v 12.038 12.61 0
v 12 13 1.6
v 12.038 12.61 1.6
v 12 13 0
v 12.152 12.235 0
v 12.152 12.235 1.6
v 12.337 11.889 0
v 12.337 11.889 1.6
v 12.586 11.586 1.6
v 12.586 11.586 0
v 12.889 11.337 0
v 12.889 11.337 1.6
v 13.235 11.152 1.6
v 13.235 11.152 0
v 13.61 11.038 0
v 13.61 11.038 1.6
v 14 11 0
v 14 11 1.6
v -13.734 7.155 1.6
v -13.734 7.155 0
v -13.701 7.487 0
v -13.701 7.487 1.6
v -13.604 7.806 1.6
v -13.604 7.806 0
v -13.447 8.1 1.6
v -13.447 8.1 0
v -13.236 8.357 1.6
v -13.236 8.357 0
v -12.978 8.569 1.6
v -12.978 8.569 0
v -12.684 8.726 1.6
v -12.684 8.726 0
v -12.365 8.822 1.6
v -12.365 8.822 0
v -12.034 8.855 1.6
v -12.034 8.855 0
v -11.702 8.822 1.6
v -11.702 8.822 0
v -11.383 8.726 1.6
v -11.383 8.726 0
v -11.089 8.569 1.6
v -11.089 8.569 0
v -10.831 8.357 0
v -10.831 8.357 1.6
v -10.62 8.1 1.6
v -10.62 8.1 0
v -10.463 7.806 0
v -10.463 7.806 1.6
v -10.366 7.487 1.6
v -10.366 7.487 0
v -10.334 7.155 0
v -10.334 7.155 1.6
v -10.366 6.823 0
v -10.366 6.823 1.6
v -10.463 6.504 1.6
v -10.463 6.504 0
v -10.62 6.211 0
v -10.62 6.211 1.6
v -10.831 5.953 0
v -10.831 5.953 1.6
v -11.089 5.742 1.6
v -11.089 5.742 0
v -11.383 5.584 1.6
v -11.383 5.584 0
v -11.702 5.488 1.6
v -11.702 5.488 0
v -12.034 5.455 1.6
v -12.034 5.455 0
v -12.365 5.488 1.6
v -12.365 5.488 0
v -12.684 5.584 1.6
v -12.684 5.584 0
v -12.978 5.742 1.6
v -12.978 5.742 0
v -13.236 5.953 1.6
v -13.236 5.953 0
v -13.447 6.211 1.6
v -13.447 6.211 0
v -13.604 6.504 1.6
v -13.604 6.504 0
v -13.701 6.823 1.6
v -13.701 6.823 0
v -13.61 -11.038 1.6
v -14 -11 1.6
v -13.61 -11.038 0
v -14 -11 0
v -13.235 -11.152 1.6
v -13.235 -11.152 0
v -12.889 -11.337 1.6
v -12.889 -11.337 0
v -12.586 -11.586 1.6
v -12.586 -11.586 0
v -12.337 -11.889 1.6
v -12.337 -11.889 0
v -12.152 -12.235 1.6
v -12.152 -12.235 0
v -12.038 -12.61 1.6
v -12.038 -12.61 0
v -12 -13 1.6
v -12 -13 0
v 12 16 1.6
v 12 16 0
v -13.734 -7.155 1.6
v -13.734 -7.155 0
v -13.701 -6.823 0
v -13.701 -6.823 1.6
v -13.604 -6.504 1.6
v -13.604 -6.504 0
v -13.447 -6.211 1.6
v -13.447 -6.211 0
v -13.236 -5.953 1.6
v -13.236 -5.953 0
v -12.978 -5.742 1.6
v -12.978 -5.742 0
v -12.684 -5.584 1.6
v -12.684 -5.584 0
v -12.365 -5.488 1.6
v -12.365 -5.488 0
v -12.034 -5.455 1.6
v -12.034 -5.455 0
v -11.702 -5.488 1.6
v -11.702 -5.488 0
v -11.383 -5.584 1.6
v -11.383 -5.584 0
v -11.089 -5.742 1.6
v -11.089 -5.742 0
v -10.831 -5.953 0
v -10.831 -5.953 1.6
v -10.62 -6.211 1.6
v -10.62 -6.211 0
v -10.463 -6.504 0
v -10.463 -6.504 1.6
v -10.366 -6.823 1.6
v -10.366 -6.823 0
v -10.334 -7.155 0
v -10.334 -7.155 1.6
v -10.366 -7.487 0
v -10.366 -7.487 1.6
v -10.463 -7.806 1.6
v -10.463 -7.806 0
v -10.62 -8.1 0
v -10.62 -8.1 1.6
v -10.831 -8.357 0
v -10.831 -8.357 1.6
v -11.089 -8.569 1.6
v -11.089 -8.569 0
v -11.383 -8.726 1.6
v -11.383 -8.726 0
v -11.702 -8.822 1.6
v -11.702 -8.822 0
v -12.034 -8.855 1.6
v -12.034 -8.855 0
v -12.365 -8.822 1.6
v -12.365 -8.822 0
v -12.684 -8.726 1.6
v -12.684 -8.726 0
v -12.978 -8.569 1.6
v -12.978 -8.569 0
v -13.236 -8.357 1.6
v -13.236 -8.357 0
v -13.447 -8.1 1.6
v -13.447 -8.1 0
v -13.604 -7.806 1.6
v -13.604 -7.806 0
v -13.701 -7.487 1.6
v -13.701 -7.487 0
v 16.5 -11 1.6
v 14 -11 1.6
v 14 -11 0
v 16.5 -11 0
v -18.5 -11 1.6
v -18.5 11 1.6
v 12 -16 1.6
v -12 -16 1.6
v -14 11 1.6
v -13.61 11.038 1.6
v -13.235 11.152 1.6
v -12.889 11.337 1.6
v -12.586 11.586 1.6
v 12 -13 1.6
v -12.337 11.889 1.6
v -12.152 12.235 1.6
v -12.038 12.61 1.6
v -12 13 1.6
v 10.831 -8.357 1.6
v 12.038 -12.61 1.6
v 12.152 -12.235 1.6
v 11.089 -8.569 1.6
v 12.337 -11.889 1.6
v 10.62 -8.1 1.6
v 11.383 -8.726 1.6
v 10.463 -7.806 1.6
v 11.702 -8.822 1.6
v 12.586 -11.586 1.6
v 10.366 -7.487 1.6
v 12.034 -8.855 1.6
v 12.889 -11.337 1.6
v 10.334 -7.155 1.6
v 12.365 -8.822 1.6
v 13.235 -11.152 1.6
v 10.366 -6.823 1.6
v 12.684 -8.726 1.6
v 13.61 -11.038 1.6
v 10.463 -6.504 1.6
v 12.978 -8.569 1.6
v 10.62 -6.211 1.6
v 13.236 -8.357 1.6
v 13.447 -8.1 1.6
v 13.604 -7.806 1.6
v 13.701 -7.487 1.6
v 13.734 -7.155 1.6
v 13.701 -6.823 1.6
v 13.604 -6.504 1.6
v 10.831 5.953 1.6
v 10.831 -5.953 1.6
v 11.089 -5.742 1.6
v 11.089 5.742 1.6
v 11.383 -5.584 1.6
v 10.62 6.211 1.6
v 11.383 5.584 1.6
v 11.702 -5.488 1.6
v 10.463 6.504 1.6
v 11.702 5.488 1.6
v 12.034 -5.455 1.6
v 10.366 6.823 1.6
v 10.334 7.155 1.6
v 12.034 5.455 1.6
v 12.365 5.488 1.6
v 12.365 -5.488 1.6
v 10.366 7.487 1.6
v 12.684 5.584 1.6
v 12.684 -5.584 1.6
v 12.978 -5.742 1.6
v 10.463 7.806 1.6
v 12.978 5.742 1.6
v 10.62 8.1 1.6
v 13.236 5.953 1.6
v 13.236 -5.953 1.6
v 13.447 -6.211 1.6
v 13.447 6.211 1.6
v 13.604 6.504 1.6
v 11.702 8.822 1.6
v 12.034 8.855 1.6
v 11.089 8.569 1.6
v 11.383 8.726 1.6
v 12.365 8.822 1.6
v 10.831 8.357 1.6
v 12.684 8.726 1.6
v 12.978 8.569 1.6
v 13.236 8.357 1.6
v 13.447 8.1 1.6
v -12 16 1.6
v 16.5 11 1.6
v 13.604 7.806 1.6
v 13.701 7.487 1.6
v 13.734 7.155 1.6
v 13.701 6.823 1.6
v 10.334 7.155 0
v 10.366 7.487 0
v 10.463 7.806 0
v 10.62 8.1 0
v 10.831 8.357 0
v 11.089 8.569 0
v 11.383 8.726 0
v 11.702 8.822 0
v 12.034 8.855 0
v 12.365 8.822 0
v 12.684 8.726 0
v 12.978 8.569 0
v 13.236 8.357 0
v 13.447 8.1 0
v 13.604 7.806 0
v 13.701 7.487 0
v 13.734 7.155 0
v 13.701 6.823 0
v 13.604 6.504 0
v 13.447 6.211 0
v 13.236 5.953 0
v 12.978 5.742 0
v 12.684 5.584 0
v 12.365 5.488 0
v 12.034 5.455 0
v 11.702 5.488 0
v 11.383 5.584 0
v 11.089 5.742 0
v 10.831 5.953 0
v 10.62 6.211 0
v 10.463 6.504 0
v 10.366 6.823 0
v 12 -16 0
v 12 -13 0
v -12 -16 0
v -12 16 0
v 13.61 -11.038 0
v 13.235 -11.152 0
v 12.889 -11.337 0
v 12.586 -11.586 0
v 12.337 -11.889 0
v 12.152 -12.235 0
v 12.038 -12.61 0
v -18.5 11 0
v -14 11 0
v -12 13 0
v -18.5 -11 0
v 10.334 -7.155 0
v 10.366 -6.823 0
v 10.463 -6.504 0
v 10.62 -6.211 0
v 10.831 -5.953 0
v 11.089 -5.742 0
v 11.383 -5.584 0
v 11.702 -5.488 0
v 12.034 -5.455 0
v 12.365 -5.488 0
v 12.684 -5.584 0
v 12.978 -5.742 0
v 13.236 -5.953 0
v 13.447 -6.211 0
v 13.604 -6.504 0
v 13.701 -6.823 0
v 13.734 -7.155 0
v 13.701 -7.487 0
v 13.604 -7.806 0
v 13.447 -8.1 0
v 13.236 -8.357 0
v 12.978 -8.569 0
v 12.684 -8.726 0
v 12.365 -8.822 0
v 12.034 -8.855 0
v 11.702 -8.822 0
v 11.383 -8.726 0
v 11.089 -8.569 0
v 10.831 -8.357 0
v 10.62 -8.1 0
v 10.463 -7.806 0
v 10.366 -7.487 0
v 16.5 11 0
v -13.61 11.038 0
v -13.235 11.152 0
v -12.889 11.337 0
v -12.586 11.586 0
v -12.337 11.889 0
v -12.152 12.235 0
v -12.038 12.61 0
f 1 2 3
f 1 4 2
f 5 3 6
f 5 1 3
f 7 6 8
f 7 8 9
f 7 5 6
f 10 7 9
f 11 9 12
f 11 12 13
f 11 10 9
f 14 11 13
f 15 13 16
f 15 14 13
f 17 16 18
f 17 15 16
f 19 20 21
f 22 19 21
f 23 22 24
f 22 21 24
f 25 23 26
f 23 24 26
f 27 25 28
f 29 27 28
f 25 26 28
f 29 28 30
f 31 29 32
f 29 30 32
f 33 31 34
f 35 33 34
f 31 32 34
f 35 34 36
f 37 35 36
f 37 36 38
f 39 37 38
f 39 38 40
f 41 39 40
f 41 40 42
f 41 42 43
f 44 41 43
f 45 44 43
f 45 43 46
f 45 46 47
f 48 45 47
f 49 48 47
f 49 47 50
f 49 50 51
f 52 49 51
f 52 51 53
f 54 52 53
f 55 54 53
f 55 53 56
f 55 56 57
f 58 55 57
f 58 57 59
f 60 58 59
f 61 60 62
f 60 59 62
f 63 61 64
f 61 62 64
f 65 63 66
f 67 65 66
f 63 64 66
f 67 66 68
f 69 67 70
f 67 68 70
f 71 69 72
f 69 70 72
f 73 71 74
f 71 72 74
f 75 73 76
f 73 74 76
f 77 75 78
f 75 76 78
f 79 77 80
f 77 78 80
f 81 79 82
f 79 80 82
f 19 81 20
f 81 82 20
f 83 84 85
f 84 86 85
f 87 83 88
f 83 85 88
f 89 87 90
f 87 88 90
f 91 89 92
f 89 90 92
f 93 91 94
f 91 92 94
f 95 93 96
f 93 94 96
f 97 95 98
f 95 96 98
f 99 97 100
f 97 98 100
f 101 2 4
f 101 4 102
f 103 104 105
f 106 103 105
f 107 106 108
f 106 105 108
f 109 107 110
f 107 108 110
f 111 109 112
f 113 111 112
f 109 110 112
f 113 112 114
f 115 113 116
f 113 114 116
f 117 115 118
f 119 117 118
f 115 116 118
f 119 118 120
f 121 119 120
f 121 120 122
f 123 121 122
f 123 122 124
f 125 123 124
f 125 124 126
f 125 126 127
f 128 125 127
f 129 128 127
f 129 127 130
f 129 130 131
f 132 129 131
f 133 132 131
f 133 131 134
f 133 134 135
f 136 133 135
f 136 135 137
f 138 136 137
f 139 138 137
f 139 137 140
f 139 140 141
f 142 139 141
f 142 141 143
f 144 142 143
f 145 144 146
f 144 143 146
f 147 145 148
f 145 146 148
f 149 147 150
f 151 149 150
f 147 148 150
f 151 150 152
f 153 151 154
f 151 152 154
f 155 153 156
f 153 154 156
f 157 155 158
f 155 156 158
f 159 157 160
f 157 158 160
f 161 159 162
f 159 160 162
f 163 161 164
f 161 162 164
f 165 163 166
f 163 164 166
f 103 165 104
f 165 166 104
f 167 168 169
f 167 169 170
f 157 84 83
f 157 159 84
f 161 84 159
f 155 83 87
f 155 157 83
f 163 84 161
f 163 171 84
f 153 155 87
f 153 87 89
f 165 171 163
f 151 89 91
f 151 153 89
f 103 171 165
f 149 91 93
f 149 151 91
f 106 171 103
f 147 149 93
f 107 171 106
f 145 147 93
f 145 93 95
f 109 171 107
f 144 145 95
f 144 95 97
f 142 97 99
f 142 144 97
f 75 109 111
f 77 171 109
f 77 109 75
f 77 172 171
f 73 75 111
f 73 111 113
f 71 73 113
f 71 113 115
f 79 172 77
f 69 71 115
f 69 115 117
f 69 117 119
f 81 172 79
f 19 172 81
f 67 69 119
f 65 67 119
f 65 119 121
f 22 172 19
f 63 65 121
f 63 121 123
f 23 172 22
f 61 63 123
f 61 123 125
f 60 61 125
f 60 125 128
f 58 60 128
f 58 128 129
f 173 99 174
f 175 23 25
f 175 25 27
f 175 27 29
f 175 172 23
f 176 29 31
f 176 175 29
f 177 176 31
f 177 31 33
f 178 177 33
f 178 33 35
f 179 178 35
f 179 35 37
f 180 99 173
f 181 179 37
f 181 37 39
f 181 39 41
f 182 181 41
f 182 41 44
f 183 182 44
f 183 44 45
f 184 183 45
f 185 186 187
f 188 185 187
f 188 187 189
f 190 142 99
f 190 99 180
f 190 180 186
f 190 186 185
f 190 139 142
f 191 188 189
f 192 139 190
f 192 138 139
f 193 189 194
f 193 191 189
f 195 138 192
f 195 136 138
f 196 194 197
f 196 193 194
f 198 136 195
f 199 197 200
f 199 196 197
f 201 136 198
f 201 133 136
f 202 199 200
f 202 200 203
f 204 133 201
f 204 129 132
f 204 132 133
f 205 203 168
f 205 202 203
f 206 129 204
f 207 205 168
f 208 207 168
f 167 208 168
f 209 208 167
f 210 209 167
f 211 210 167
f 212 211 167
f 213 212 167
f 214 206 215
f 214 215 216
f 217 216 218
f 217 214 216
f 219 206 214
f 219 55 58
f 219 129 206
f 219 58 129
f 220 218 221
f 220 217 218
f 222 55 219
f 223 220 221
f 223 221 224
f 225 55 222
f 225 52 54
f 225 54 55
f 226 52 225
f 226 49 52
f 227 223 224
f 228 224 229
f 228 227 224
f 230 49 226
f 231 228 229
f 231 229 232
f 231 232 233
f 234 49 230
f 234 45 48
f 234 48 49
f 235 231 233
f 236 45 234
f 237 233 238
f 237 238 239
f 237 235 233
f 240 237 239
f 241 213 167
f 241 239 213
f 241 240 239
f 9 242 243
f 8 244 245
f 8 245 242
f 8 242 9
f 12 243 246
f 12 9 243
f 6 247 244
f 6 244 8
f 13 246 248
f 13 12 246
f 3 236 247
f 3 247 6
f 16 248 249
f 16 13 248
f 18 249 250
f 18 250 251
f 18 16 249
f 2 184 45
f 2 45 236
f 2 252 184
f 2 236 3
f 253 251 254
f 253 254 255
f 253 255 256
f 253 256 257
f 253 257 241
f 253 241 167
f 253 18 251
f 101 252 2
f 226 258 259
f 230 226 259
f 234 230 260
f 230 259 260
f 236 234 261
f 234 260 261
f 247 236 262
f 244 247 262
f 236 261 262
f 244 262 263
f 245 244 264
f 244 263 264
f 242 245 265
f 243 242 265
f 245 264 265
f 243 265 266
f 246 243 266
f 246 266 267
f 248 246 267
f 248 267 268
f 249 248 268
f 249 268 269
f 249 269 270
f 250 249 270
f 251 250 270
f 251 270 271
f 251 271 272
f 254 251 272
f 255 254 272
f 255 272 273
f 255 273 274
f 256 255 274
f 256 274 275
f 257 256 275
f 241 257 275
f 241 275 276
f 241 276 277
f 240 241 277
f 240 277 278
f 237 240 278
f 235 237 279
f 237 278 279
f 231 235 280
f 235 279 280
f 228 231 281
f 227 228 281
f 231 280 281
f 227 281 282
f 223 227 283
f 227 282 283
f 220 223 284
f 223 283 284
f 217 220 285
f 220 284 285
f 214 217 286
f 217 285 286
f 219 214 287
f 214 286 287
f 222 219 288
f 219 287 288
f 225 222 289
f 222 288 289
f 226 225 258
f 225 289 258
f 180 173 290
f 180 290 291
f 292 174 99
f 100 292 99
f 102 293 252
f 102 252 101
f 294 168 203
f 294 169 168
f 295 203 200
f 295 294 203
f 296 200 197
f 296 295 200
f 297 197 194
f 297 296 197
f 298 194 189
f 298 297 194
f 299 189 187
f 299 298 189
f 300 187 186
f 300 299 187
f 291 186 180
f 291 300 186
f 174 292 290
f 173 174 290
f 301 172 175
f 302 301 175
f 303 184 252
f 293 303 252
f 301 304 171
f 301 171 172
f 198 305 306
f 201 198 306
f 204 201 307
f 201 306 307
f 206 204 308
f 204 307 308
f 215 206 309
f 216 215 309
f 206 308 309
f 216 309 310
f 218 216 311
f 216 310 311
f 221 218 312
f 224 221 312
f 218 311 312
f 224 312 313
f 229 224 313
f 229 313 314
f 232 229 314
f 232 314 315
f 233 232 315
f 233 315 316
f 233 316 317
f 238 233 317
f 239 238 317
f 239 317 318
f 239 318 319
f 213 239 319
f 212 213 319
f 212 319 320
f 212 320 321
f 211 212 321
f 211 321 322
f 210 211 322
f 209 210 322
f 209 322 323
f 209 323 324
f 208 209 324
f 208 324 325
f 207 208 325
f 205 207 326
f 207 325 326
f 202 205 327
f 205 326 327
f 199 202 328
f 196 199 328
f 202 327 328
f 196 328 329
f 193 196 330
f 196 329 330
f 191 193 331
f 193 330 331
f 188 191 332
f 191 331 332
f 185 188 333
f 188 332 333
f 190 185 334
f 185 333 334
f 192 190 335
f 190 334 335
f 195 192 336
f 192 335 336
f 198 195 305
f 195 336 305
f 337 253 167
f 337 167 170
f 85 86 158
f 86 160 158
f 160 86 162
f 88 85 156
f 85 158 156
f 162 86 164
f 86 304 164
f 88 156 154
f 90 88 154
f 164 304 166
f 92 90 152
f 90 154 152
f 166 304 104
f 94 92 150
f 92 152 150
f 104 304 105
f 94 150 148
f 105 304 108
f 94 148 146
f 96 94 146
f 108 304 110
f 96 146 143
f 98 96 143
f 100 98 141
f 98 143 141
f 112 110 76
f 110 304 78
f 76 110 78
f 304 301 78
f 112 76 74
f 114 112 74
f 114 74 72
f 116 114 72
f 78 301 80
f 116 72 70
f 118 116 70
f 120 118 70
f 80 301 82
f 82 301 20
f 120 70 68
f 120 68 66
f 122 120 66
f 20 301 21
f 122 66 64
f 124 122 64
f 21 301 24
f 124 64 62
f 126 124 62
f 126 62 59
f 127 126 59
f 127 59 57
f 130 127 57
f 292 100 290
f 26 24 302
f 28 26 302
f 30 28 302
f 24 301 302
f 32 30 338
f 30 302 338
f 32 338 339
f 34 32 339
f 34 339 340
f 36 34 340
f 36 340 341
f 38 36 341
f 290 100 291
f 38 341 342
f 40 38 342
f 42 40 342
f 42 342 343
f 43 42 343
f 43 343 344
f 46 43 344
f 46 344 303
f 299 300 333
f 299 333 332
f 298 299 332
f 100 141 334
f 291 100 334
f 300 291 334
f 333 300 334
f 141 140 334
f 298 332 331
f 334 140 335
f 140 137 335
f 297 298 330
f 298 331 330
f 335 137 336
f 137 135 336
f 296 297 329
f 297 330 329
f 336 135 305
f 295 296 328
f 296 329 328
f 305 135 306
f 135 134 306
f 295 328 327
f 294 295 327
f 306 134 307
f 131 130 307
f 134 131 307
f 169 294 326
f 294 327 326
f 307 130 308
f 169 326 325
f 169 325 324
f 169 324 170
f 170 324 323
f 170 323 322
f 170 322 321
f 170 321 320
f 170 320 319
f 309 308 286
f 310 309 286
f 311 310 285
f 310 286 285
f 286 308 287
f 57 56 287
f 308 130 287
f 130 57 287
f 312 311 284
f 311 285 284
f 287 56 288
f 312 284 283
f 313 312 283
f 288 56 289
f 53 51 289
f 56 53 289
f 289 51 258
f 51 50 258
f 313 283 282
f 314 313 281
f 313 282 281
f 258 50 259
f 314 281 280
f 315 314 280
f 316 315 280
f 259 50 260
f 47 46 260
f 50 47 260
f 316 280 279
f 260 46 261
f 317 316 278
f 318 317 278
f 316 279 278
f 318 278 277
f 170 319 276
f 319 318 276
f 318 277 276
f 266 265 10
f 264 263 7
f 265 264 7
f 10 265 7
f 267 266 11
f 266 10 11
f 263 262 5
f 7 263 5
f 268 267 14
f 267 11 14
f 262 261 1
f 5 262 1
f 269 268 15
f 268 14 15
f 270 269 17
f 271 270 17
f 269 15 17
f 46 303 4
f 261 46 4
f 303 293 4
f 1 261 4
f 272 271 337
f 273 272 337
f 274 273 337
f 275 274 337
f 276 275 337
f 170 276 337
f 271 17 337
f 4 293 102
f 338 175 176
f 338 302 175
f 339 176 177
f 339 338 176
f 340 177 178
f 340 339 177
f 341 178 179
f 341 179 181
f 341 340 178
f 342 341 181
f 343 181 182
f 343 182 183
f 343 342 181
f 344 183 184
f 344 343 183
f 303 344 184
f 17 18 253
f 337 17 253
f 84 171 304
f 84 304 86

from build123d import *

# Parameters (mm, degrees)
SKETCH_1_W            = 37
SKETCH_1_H            = 32
EXTRUDE_1_DEPTH       = 1.6
SKETCH_2_W            = 6.5
SKETCH_2_H            = 5
CUT_EXTRUDE_1_DEPTH   = 25.511425907
FILLET_1_R            = 2
HOLE_WIZARD_M31_D     = 3.4
HOLE_WIZARD_M31_DEPTH = 18
HOLE_WIZARD_M31_TIP   = 1.021463052
SKETCH_7_W            = 1.6
SKETCH_7_H            = 24.851674328
CUT_EXTRUDE_2_DEPTH   = 2


with BuildPart() as part:
    # Эскиз1 → Бобышка-Вытянуть1 (new body)
    with BuildSketch(Plane.XY):
        Rectangle(SKETCH_1_W, SKETCH_1_H)
    extrude(amount=EXTRUDE_1_DEPTH)

    # Эскиз2 → Вырез-Вытянуть1 (cut, through all)
    with BuildSketch(Plane.XY.offset(1.6)):
        with Locations((-15.25, 13.5)):
            Rectangle(SKETCH_2_W, SKETCH_2_H)
        with Locations((15.25, 13.5)):
            Rectangle(SKETCH_2_W, SKETCH_2_H)
        with Locations((15.25, -13.5)):
            Rectangle(SKETCH_2_W, SKETCH_2_H)
        with Locations((-15.25, -13.5)):
            Rectangle(SKETCH_2_W, SKETCH_2_H)
    extrude(amount=-CUT_EXTRUDE_1_DEPTH, mode=Mode.SUBTRACT)

    # Скругление1
    fillet_1_edges = [part.edges().sort_by_distance(p)[0] for p in [
        (-12, 11, 0.8),
        (12, 11, 0.8),
        (12, -11, 0.8),
        (-12, -11, 0.8),
    ]]
    fillet(fillet_1_edges, radius=FILLET_1_R)

    # Отверстие с зазором M31
    with Locations(Plane.XY.offset(1.6)):
        with Locations((-12.033502432, 7.1550555), (12.033502432, 7.1550555), (12.033502432, -7.1550555), (-12.033502432, -7.1550555)):
            Hole(HOLE_WIZARD_M31_D / 2, depth=HOLE_WIZARD_M31_DEPTH)
            with Locations((0, 0, -(HOLE_WIZARD_M31_DEPTH + HOLE_WIZARD_M31_TIP / 2))):  # 118° drill point
                Cone(0, HOLE_WIZARD_M31_D / 2, HOLE_WIZARD_M31_TIP, mode=Mode.SUBTRACT)

    # Эскиз7 → Вырез-Вытянуть2 (cut)
    with BuildSketch(Plane(origin=(18.5, 0, 0), x_dir=(0, 0, -1), z_dir=(1, 0, 0))):
        with Locations((-0.8, 0)):
            Rectangle(SKETCH_7_W, SKETCH_7_H)
    extrude(amount=-CUT_EXTRUDE_2_DEPTH, mode=Mode.SUBTRACT)


solid = part.part
